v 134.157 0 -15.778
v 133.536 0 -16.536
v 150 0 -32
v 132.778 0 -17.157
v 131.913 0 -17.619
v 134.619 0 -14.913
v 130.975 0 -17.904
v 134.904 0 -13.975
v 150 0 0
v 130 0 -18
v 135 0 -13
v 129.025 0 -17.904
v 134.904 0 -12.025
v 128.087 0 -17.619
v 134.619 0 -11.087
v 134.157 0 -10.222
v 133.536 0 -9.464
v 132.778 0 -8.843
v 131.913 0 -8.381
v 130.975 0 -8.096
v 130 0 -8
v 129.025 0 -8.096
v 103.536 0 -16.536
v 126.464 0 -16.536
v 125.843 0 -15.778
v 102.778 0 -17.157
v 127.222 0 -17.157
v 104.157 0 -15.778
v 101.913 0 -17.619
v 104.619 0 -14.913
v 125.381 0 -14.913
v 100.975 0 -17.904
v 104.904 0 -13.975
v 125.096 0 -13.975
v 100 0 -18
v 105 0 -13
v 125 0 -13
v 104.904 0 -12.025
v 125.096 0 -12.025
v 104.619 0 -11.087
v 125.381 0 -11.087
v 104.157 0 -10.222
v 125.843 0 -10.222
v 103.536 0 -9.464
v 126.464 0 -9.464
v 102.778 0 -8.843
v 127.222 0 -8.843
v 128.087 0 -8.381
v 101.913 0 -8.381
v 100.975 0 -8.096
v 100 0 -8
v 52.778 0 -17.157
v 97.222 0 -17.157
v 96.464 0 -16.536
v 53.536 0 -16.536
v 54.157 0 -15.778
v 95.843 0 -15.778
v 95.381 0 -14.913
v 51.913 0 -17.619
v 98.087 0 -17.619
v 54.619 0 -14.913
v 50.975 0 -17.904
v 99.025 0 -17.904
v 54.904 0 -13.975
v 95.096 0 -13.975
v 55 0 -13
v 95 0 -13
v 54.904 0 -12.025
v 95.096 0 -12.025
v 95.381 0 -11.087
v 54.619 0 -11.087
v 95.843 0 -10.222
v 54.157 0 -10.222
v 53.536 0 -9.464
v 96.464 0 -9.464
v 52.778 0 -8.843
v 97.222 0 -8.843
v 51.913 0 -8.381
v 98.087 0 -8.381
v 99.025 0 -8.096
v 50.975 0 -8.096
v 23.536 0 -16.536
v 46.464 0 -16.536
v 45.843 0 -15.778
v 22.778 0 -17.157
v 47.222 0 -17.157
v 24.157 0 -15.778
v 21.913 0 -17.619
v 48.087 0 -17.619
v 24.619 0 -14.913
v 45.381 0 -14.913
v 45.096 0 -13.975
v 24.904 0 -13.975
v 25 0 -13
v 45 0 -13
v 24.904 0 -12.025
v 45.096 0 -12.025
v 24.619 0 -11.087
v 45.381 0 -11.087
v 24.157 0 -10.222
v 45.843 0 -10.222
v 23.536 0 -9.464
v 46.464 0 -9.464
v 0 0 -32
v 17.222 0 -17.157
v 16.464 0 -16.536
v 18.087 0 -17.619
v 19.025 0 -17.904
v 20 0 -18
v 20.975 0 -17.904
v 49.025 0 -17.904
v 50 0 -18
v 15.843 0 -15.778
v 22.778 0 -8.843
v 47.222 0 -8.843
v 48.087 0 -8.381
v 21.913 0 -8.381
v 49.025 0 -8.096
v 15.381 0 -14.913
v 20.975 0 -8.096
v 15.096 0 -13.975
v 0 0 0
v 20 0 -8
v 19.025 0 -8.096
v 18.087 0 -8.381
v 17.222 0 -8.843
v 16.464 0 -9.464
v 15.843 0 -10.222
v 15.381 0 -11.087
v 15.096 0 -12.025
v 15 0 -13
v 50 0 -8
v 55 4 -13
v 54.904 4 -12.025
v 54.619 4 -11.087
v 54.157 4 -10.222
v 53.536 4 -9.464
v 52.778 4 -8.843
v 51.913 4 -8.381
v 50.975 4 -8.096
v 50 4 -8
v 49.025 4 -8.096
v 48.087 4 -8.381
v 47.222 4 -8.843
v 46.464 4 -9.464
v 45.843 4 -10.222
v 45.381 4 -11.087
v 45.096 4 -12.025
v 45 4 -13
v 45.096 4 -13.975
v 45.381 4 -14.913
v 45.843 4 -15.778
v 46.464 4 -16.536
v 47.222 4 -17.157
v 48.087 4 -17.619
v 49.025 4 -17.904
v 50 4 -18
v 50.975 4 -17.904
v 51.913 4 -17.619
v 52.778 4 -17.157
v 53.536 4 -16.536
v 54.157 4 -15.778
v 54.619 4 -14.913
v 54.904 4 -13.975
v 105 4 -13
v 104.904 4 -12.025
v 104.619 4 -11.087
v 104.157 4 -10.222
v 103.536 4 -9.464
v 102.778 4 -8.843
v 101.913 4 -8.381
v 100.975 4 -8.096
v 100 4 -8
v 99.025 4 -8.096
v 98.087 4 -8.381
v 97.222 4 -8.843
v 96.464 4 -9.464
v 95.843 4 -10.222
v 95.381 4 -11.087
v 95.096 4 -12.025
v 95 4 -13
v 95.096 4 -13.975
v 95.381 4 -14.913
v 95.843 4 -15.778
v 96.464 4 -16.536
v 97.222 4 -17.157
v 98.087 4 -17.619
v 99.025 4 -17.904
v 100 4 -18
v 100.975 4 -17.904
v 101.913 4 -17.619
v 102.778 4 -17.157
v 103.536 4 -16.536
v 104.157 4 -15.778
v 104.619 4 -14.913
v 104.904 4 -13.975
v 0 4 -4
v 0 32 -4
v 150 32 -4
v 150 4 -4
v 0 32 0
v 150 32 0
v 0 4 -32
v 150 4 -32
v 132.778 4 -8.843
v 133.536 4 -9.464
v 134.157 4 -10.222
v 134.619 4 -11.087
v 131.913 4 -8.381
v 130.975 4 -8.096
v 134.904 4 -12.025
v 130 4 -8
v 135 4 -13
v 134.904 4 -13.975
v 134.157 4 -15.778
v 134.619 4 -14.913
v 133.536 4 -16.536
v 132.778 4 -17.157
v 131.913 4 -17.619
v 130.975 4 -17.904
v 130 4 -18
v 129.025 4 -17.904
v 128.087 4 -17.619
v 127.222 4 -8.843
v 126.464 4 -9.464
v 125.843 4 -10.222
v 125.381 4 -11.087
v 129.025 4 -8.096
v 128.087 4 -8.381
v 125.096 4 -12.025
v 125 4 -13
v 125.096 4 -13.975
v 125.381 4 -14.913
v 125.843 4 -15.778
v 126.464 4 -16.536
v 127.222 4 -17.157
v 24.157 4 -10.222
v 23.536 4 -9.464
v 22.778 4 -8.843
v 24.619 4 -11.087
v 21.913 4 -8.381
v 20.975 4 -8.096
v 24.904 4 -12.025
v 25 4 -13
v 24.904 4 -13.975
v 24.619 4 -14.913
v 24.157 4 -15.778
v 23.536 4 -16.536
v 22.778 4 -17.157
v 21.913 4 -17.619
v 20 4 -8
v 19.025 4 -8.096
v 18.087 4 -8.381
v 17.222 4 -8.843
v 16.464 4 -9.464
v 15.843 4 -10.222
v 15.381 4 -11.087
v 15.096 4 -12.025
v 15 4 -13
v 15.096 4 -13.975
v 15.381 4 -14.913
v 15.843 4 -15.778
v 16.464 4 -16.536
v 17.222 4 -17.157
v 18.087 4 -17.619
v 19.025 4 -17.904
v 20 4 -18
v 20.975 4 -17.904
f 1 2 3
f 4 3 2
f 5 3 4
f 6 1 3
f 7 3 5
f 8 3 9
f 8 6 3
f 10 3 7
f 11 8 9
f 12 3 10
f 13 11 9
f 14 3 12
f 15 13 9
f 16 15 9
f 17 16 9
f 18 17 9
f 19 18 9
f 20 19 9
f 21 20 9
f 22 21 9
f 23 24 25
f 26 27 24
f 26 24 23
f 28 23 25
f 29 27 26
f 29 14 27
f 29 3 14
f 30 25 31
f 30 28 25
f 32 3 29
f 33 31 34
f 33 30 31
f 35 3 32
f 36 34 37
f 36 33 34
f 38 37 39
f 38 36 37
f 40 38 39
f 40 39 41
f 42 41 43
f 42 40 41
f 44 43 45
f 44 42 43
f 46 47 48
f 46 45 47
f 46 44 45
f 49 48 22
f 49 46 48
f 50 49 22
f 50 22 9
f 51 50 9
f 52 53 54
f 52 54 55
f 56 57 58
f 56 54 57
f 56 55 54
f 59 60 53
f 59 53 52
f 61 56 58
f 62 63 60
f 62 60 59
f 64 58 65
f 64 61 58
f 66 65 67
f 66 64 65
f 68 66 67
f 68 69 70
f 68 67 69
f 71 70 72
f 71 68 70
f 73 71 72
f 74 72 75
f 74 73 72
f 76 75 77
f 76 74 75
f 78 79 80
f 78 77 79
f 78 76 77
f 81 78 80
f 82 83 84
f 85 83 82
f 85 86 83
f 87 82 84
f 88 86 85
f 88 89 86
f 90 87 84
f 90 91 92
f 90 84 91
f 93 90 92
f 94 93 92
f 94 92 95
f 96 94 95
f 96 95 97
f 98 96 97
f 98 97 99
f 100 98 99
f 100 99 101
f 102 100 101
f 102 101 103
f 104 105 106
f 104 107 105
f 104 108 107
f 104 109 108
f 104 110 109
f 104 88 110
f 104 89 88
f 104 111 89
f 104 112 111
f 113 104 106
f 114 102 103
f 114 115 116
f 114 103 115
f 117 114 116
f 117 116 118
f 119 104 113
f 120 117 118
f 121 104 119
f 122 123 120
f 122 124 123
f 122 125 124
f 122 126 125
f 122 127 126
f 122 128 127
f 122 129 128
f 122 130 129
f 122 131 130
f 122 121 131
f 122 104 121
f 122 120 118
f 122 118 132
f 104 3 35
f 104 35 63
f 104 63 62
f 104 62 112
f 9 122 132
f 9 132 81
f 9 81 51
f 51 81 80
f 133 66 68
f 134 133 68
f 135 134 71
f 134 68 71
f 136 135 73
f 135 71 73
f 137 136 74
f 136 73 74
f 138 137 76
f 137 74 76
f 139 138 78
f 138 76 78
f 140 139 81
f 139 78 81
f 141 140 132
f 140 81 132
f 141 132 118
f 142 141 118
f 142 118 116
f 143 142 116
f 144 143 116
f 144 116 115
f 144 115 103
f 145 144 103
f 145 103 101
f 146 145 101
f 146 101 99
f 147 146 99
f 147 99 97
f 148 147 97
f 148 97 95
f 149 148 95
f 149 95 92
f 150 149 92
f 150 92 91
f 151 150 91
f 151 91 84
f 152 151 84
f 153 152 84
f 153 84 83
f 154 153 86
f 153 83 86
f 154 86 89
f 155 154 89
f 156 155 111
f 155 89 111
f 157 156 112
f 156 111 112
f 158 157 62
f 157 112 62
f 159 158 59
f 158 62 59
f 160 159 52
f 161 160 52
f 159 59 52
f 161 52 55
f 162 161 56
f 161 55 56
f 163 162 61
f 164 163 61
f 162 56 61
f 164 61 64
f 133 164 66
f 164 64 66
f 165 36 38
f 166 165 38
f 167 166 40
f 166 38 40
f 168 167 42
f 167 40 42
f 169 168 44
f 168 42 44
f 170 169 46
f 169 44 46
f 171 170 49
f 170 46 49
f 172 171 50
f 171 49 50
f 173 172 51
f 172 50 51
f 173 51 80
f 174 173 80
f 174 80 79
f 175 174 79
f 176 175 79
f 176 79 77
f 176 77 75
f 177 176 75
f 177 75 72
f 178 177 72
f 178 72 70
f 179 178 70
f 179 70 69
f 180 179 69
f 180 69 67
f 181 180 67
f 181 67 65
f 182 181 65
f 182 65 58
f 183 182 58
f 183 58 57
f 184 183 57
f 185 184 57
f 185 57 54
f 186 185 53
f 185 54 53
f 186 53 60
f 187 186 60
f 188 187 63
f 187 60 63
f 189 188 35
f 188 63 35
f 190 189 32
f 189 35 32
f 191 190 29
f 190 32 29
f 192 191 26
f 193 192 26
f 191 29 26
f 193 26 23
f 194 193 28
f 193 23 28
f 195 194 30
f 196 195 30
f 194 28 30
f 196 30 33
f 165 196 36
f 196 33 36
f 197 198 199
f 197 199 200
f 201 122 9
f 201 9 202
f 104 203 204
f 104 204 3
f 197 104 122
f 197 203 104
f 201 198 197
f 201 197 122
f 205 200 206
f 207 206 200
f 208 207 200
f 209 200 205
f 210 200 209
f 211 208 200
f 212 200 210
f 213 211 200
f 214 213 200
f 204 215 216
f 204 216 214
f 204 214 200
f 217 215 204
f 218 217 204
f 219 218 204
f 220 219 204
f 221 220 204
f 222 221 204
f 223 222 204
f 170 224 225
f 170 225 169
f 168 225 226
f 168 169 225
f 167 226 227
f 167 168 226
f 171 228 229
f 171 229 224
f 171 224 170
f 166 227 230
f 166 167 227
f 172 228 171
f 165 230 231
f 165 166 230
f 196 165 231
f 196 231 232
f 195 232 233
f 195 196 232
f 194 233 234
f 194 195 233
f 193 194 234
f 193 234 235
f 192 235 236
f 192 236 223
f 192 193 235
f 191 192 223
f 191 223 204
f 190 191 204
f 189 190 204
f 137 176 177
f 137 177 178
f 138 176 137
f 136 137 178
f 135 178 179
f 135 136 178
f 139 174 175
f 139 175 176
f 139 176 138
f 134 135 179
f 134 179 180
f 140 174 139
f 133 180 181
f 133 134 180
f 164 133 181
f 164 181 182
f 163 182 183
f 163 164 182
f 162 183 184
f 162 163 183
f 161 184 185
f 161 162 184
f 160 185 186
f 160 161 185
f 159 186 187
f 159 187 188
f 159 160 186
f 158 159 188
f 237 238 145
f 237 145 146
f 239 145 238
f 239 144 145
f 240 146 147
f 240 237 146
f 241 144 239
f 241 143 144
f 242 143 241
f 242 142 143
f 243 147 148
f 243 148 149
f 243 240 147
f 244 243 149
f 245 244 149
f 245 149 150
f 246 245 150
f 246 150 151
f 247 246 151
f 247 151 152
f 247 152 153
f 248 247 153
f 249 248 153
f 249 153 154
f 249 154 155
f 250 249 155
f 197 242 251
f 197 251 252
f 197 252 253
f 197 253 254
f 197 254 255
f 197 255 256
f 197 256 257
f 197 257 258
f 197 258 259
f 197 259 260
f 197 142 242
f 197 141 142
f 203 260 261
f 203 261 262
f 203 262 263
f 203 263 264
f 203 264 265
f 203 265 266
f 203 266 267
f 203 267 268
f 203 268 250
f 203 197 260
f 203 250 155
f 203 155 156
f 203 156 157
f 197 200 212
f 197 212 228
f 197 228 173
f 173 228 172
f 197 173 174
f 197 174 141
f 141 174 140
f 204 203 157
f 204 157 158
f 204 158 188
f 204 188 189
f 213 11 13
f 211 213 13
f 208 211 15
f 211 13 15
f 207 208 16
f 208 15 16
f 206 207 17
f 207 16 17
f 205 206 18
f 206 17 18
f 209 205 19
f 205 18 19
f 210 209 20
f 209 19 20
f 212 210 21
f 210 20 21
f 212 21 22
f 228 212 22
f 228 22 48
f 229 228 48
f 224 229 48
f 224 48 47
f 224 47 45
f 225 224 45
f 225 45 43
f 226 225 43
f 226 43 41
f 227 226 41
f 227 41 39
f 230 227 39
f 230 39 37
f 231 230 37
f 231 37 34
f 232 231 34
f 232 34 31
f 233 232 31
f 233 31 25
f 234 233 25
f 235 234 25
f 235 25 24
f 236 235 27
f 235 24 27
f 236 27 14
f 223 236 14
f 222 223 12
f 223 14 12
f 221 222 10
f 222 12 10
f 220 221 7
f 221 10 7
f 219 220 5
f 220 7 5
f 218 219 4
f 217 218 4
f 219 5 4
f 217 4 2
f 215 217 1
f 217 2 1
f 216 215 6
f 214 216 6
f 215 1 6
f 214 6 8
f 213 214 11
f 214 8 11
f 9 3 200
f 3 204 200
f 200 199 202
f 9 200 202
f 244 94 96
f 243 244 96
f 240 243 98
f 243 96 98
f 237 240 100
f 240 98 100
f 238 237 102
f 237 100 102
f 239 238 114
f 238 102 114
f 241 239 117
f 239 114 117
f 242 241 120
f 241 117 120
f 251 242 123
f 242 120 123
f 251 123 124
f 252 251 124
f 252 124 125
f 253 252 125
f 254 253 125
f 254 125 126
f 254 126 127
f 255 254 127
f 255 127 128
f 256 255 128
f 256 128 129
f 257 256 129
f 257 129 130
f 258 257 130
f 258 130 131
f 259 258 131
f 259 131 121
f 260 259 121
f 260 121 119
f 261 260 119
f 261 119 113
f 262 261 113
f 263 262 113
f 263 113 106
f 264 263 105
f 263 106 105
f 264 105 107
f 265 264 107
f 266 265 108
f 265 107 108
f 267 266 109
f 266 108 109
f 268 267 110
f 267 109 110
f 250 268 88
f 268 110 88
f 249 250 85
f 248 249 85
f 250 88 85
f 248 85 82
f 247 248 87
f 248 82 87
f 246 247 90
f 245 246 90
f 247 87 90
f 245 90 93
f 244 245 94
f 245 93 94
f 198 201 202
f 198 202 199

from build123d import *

# Parameters (mm, degrees)
EXTRUDE_1_DEPTH     = 150
SKETCH_2_R          = 5
CUT_EXTRUDE_1_DEPTH = 33


with BuildPart() as part:
    # Эскиз1 → Вытянуть-Тонкостенный1 (new body)
    with BuildSketch(Plane(origin=(0, 0, 0), x_dir=(0, 0, -1), z_dir=(1, 0, 0))):
        Polygon((32, 0), (0, 0), (0, 32), (4, 32), (4, 4), (32, 4), align=None)
    extrude(amount=EXTRUDE_1_DEPTH)

    # Эскиз2 → Вырез-Вытянуть1 (cut, through all)
    with BuildSketch(Plane.XZ):
        with Locations((130, -13)):
            Circle(SKETCH_2_R)
        with Locations((100, -13)):
            Circle(SKETCH_2_R)
        with Locations((50, -13)):
            Circle(SKETCH_2_R)
        with Locations((20, -13)):
            Circle(SKETCH_2_R)
    extrude(amount=-CUT_EXTRUDE_1_DEPTH, mode=Mode.SUBTRACT)


solid = part.part
